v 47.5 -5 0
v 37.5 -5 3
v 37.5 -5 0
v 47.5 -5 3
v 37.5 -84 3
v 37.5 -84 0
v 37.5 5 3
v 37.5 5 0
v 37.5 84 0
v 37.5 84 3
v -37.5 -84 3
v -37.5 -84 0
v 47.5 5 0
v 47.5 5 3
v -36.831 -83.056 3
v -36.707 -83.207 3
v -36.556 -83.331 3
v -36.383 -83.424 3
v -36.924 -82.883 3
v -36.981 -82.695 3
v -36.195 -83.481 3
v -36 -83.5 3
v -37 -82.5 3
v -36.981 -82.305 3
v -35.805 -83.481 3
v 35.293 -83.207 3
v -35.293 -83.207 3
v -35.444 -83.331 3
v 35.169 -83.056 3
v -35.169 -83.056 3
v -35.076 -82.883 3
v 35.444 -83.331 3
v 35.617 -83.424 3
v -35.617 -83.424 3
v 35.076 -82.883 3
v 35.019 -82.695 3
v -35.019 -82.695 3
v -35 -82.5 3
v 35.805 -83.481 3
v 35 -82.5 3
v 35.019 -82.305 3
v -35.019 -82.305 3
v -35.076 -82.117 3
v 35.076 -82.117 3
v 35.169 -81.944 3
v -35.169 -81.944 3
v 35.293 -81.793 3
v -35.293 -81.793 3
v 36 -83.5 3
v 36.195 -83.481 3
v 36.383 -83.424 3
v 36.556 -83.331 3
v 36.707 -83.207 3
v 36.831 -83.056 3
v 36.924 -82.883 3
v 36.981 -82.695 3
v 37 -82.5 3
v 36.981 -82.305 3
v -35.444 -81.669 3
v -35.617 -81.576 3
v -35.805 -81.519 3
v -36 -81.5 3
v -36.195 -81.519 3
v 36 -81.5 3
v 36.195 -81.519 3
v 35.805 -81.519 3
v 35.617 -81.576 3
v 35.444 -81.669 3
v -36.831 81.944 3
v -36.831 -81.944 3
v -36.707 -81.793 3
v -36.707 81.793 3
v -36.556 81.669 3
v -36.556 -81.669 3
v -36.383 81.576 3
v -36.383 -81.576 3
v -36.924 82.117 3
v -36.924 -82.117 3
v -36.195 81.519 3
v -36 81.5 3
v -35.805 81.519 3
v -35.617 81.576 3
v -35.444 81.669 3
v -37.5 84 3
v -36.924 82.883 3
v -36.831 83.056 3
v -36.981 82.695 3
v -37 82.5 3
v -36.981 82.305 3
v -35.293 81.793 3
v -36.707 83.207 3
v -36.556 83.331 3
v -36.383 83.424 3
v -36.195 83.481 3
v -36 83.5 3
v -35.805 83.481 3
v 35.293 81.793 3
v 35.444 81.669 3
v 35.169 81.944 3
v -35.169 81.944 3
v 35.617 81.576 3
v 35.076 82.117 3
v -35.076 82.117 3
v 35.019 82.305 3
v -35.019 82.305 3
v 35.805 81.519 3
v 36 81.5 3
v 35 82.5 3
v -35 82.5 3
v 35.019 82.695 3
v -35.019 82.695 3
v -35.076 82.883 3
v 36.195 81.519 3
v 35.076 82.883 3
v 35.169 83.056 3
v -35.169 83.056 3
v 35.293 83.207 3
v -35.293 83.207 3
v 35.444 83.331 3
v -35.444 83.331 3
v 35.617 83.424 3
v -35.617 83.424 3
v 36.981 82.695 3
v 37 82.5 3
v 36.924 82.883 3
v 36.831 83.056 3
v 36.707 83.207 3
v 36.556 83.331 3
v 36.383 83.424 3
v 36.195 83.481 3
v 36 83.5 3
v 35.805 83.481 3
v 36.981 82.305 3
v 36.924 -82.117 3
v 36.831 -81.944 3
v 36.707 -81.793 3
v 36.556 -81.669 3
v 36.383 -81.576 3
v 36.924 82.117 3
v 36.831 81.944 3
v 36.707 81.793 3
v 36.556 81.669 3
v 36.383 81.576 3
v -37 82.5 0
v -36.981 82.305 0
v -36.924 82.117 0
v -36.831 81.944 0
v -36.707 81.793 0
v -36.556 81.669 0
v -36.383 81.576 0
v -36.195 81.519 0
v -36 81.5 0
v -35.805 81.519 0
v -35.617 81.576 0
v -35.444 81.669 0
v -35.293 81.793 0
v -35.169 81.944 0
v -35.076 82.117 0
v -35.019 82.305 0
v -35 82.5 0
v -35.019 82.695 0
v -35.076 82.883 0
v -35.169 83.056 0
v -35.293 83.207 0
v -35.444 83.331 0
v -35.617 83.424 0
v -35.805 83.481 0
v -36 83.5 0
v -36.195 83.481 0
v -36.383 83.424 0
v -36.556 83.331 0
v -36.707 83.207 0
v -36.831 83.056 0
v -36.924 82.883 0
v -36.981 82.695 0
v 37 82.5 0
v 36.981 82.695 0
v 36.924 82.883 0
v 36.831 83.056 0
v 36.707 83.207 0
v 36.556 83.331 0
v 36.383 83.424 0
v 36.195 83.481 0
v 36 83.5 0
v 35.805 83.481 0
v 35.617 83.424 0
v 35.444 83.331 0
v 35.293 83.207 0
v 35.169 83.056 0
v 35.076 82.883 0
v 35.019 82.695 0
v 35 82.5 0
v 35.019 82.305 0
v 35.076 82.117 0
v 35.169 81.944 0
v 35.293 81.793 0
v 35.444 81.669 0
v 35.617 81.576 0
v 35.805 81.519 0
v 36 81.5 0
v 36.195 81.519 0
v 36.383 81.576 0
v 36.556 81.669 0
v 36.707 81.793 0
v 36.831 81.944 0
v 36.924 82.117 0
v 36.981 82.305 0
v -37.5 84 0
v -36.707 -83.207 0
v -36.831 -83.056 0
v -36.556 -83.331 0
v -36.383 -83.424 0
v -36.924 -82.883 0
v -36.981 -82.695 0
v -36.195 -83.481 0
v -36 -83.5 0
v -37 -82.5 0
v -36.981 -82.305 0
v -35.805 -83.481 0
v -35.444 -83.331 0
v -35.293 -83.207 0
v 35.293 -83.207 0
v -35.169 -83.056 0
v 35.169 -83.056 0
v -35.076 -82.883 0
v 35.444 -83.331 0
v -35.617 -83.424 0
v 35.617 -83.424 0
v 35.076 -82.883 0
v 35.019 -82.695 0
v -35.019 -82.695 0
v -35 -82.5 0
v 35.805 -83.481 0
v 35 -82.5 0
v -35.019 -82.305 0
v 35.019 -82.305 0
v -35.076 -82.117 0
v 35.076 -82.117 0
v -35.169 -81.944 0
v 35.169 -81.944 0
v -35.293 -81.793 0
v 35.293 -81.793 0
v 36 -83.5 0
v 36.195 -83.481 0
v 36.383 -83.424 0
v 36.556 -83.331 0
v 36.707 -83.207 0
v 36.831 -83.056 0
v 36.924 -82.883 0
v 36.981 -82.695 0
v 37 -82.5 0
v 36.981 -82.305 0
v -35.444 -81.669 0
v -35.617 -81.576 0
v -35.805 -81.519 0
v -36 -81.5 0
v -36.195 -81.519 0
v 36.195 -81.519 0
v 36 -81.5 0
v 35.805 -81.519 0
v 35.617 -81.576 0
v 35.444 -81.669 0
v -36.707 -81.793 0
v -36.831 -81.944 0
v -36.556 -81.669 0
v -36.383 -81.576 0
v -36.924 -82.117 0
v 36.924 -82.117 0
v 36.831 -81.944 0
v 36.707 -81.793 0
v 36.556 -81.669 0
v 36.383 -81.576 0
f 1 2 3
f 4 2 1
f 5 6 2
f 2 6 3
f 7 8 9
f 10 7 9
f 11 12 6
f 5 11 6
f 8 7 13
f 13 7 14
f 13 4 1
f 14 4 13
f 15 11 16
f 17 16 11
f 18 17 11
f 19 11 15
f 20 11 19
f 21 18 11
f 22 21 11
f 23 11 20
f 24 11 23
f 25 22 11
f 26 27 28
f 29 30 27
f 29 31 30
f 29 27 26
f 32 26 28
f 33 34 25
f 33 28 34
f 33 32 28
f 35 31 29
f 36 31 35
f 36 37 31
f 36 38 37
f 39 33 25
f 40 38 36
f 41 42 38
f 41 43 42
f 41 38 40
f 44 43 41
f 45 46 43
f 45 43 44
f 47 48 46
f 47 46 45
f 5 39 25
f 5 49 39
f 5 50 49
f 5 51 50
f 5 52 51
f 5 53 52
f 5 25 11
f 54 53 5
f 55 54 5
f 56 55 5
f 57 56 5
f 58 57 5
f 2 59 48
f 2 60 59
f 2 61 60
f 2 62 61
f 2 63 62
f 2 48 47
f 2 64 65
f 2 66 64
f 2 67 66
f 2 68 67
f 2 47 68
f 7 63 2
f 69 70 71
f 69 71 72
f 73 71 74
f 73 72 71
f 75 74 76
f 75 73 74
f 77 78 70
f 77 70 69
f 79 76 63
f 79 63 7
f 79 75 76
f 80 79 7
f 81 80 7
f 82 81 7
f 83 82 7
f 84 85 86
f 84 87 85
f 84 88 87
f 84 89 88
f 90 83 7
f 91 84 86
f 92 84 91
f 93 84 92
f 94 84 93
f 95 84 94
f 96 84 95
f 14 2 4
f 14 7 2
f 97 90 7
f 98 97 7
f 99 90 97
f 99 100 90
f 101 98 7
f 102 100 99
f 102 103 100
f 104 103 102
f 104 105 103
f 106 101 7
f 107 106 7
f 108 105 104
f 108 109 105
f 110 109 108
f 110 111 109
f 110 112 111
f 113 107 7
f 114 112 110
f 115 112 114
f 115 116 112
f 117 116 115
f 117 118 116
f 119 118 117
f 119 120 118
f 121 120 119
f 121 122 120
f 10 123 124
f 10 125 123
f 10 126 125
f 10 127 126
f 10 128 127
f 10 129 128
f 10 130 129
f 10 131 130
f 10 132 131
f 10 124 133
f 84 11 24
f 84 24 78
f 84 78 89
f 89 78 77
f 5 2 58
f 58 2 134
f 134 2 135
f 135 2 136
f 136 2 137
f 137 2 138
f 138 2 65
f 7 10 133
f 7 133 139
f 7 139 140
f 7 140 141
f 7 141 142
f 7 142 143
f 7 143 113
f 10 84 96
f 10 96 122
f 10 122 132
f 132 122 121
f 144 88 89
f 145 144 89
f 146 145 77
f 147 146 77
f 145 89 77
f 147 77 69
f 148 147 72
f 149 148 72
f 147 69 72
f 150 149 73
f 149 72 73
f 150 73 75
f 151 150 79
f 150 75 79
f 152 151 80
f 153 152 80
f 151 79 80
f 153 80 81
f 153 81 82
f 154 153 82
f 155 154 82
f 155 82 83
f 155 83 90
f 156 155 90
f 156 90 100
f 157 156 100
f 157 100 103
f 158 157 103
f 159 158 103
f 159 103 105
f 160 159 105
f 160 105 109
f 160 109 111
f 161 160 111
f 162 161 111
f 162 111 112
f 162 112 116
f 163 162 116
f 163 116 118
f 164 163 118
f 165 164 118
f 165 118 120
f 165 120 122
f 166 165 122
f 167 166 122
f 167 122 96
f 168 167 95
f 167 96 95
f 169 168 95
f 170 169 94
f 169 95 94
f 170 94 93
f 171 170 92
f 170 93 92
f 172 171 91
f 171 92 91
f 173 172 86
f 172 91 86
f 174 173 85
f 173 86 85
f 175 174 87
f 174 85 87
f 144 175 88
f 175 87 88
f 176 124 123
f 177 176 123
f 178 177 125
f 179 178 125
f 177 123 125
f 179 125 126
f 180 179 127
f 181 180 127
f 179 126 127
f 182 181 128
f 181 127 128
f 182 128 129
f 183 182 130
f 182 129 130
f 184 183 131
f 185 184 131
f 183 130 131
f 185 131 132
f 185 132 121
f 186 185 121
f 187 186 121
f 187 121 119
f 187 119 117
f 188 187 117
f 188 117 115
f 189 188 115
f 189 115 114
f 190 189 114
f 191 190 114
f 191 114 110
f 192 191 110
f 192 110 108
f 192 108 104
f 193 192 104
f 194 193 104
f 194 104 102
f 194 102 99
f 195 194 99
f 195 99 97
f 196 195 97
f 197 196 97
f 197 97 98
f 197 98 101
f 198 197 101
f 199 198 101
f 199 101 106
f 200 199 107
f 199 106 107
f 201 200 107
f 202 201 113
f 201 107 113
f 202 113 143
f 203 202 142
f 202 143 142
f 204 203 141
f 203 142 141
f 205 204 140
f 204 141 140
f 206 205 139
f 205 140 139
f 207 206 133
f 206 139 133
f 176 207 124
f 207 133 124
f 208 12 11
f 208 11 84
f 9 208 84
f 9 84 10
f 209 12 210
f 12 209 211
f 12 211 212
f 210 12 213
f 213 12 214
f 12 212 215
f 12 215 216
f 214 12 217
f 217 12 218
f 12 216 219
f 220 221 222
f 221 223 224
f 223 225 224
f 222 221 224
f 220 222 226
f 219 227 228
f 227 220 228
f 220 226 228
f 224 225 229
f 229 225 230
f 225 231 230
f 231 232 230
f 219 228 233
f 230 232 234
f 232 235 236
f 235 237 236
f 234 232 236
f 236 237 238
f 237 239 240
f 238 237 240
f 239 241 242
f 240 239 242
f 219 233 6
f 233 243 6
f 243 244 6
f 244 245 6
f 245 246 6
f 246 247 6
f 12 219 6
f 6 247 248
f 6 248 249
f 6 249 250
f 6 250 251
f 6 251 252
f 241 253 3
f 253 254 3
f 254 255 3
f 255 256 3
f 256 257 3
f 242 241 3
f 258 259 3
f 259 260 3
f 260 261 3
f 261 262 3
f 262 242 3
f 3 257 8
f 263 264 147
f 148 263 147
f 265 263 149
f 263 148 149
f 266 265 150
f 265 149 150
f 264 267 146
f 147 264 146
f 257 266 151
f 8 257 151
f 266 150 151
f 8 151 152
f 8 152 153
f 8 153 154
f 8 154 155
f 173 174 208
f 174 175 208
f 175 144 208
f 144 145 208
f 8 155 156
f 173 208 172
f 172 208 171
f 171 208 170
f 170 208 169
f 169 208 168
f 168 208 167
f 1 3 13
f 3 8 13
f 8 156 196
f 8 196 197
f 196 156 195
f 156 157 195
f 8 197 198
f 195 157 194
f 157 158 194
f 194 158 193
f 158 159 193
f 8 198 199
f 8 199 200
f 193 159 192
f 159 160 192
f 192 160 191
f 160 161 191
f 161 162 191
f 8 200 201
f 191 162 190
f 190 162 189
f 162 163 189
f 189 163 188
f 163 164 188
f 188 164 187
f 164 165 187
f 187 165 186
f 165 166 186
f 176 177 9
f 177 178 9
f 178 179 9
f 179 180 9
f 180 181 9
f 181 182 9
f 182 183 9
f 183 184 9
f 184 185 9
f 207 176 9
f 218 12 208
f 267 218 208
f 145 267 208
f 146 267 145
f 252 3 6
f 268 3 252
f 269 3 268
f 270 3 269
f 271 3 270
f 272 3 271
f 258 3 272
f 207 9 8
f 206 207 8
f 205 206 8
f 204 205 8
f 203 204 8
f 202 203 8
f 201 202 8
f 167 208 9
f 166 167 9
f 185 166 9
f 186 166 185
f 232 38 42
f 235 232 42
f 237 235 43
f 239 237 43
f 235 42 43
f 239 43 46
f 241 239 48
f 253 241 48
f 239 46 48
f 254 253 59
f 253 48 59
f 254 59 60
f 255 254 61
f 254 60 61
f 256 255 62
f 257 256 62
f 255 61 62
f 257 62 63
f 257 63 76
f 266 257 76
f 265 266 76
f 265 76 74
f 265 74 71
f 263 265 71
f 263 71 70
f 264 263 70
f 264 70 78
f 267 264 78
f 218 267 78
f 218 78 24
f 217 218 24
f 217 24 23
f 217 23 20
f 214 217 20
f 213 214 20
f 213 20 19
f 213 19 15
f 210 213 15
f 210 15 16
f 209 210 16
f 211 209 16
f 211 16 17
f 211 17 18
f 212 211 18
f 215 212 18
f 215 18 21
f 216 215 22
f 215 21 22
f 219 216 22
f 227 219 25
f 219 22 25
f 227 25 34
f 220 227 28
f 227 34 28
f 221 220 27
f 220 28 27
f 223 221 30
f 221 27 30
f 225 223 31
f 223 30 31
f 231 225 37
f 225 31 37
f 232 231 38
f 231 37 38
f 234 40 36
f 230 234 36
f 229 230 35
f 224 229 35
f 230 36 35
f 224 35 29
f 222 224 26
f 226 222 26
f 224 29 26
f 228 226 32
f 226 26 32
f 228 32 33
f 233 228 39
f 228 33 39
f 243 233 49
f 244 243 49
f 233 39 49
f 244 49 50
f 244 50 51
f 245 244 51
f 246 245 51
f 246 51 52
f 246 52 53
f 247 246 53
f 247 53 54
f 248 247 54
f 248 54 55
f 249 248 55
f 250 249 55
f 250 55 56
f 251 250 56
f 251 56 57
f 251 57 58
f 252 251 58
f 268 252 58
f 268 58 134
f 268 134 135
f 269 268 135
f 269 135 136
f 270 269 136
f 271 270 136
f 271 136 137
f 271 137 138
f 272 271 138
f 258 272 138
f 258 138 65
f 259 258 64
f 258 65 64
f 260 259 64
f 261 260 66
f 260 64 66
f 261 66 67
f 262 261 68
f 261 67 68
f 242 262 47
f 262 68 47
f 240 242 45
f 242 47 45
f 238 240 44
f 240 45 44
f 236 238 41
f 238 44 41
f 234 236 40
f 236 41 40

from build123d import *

# Parameters (mm, degrees)
SKETCH1_W           = 75
SKETCH1_H           = 168
BOSS_EXTRUDE1_DEPTH = 3
SKETCH2_R           = 1
CUT_EXTRUDE1_DEPTH  = 93.03939374
SKETCH3_W           = 10
SKETCH3_H           = 10
BOSS_EXTRUDE2_DEPTH = 3


with BuildPart() as part:
    # Sketch1 → Boss-Extrude1 (new body)
    with BuildSketch(Plane.XY):
        Rectangle(SKETCH1_W, SKETCH1_H)
    extrude(amount=BOSS_EXTRUDE1_DEPTH)

    # Sketch2 → Cut-Extrude1 (cut, through all)
    with BuildSketch(Plane.XY.offset(3)):
        with Locations((36, 82.5)):
            Circle(SKETCH2_R)
        with Locations(Location((-36, 82.5, 0), (0, 0, 180))):
            Circle(SKETCH2_R)
        with Locations(Location((36, -82.5, 0), (0, 0, 180))):
            Circle(SKETCH2_R)
        with Locations((-36, -82.5)):
            Circle(SKETCH2_R)
    extrude(amount=-CUT_EXTRUDE1_DEPTH, mode=Mode.SUBTRACT)

    # Sketch3 → Boss-Extrude2 (add)
    with BuildSketch(Plane.XY.offset(3)):
        with Locations((42.5, 0)):
            Rectangle(SKETCH3_W, SKETCH3_H)
    extrude(amount=-BOSS_EXTRUDE2_DEPTH)


solid = part.part
